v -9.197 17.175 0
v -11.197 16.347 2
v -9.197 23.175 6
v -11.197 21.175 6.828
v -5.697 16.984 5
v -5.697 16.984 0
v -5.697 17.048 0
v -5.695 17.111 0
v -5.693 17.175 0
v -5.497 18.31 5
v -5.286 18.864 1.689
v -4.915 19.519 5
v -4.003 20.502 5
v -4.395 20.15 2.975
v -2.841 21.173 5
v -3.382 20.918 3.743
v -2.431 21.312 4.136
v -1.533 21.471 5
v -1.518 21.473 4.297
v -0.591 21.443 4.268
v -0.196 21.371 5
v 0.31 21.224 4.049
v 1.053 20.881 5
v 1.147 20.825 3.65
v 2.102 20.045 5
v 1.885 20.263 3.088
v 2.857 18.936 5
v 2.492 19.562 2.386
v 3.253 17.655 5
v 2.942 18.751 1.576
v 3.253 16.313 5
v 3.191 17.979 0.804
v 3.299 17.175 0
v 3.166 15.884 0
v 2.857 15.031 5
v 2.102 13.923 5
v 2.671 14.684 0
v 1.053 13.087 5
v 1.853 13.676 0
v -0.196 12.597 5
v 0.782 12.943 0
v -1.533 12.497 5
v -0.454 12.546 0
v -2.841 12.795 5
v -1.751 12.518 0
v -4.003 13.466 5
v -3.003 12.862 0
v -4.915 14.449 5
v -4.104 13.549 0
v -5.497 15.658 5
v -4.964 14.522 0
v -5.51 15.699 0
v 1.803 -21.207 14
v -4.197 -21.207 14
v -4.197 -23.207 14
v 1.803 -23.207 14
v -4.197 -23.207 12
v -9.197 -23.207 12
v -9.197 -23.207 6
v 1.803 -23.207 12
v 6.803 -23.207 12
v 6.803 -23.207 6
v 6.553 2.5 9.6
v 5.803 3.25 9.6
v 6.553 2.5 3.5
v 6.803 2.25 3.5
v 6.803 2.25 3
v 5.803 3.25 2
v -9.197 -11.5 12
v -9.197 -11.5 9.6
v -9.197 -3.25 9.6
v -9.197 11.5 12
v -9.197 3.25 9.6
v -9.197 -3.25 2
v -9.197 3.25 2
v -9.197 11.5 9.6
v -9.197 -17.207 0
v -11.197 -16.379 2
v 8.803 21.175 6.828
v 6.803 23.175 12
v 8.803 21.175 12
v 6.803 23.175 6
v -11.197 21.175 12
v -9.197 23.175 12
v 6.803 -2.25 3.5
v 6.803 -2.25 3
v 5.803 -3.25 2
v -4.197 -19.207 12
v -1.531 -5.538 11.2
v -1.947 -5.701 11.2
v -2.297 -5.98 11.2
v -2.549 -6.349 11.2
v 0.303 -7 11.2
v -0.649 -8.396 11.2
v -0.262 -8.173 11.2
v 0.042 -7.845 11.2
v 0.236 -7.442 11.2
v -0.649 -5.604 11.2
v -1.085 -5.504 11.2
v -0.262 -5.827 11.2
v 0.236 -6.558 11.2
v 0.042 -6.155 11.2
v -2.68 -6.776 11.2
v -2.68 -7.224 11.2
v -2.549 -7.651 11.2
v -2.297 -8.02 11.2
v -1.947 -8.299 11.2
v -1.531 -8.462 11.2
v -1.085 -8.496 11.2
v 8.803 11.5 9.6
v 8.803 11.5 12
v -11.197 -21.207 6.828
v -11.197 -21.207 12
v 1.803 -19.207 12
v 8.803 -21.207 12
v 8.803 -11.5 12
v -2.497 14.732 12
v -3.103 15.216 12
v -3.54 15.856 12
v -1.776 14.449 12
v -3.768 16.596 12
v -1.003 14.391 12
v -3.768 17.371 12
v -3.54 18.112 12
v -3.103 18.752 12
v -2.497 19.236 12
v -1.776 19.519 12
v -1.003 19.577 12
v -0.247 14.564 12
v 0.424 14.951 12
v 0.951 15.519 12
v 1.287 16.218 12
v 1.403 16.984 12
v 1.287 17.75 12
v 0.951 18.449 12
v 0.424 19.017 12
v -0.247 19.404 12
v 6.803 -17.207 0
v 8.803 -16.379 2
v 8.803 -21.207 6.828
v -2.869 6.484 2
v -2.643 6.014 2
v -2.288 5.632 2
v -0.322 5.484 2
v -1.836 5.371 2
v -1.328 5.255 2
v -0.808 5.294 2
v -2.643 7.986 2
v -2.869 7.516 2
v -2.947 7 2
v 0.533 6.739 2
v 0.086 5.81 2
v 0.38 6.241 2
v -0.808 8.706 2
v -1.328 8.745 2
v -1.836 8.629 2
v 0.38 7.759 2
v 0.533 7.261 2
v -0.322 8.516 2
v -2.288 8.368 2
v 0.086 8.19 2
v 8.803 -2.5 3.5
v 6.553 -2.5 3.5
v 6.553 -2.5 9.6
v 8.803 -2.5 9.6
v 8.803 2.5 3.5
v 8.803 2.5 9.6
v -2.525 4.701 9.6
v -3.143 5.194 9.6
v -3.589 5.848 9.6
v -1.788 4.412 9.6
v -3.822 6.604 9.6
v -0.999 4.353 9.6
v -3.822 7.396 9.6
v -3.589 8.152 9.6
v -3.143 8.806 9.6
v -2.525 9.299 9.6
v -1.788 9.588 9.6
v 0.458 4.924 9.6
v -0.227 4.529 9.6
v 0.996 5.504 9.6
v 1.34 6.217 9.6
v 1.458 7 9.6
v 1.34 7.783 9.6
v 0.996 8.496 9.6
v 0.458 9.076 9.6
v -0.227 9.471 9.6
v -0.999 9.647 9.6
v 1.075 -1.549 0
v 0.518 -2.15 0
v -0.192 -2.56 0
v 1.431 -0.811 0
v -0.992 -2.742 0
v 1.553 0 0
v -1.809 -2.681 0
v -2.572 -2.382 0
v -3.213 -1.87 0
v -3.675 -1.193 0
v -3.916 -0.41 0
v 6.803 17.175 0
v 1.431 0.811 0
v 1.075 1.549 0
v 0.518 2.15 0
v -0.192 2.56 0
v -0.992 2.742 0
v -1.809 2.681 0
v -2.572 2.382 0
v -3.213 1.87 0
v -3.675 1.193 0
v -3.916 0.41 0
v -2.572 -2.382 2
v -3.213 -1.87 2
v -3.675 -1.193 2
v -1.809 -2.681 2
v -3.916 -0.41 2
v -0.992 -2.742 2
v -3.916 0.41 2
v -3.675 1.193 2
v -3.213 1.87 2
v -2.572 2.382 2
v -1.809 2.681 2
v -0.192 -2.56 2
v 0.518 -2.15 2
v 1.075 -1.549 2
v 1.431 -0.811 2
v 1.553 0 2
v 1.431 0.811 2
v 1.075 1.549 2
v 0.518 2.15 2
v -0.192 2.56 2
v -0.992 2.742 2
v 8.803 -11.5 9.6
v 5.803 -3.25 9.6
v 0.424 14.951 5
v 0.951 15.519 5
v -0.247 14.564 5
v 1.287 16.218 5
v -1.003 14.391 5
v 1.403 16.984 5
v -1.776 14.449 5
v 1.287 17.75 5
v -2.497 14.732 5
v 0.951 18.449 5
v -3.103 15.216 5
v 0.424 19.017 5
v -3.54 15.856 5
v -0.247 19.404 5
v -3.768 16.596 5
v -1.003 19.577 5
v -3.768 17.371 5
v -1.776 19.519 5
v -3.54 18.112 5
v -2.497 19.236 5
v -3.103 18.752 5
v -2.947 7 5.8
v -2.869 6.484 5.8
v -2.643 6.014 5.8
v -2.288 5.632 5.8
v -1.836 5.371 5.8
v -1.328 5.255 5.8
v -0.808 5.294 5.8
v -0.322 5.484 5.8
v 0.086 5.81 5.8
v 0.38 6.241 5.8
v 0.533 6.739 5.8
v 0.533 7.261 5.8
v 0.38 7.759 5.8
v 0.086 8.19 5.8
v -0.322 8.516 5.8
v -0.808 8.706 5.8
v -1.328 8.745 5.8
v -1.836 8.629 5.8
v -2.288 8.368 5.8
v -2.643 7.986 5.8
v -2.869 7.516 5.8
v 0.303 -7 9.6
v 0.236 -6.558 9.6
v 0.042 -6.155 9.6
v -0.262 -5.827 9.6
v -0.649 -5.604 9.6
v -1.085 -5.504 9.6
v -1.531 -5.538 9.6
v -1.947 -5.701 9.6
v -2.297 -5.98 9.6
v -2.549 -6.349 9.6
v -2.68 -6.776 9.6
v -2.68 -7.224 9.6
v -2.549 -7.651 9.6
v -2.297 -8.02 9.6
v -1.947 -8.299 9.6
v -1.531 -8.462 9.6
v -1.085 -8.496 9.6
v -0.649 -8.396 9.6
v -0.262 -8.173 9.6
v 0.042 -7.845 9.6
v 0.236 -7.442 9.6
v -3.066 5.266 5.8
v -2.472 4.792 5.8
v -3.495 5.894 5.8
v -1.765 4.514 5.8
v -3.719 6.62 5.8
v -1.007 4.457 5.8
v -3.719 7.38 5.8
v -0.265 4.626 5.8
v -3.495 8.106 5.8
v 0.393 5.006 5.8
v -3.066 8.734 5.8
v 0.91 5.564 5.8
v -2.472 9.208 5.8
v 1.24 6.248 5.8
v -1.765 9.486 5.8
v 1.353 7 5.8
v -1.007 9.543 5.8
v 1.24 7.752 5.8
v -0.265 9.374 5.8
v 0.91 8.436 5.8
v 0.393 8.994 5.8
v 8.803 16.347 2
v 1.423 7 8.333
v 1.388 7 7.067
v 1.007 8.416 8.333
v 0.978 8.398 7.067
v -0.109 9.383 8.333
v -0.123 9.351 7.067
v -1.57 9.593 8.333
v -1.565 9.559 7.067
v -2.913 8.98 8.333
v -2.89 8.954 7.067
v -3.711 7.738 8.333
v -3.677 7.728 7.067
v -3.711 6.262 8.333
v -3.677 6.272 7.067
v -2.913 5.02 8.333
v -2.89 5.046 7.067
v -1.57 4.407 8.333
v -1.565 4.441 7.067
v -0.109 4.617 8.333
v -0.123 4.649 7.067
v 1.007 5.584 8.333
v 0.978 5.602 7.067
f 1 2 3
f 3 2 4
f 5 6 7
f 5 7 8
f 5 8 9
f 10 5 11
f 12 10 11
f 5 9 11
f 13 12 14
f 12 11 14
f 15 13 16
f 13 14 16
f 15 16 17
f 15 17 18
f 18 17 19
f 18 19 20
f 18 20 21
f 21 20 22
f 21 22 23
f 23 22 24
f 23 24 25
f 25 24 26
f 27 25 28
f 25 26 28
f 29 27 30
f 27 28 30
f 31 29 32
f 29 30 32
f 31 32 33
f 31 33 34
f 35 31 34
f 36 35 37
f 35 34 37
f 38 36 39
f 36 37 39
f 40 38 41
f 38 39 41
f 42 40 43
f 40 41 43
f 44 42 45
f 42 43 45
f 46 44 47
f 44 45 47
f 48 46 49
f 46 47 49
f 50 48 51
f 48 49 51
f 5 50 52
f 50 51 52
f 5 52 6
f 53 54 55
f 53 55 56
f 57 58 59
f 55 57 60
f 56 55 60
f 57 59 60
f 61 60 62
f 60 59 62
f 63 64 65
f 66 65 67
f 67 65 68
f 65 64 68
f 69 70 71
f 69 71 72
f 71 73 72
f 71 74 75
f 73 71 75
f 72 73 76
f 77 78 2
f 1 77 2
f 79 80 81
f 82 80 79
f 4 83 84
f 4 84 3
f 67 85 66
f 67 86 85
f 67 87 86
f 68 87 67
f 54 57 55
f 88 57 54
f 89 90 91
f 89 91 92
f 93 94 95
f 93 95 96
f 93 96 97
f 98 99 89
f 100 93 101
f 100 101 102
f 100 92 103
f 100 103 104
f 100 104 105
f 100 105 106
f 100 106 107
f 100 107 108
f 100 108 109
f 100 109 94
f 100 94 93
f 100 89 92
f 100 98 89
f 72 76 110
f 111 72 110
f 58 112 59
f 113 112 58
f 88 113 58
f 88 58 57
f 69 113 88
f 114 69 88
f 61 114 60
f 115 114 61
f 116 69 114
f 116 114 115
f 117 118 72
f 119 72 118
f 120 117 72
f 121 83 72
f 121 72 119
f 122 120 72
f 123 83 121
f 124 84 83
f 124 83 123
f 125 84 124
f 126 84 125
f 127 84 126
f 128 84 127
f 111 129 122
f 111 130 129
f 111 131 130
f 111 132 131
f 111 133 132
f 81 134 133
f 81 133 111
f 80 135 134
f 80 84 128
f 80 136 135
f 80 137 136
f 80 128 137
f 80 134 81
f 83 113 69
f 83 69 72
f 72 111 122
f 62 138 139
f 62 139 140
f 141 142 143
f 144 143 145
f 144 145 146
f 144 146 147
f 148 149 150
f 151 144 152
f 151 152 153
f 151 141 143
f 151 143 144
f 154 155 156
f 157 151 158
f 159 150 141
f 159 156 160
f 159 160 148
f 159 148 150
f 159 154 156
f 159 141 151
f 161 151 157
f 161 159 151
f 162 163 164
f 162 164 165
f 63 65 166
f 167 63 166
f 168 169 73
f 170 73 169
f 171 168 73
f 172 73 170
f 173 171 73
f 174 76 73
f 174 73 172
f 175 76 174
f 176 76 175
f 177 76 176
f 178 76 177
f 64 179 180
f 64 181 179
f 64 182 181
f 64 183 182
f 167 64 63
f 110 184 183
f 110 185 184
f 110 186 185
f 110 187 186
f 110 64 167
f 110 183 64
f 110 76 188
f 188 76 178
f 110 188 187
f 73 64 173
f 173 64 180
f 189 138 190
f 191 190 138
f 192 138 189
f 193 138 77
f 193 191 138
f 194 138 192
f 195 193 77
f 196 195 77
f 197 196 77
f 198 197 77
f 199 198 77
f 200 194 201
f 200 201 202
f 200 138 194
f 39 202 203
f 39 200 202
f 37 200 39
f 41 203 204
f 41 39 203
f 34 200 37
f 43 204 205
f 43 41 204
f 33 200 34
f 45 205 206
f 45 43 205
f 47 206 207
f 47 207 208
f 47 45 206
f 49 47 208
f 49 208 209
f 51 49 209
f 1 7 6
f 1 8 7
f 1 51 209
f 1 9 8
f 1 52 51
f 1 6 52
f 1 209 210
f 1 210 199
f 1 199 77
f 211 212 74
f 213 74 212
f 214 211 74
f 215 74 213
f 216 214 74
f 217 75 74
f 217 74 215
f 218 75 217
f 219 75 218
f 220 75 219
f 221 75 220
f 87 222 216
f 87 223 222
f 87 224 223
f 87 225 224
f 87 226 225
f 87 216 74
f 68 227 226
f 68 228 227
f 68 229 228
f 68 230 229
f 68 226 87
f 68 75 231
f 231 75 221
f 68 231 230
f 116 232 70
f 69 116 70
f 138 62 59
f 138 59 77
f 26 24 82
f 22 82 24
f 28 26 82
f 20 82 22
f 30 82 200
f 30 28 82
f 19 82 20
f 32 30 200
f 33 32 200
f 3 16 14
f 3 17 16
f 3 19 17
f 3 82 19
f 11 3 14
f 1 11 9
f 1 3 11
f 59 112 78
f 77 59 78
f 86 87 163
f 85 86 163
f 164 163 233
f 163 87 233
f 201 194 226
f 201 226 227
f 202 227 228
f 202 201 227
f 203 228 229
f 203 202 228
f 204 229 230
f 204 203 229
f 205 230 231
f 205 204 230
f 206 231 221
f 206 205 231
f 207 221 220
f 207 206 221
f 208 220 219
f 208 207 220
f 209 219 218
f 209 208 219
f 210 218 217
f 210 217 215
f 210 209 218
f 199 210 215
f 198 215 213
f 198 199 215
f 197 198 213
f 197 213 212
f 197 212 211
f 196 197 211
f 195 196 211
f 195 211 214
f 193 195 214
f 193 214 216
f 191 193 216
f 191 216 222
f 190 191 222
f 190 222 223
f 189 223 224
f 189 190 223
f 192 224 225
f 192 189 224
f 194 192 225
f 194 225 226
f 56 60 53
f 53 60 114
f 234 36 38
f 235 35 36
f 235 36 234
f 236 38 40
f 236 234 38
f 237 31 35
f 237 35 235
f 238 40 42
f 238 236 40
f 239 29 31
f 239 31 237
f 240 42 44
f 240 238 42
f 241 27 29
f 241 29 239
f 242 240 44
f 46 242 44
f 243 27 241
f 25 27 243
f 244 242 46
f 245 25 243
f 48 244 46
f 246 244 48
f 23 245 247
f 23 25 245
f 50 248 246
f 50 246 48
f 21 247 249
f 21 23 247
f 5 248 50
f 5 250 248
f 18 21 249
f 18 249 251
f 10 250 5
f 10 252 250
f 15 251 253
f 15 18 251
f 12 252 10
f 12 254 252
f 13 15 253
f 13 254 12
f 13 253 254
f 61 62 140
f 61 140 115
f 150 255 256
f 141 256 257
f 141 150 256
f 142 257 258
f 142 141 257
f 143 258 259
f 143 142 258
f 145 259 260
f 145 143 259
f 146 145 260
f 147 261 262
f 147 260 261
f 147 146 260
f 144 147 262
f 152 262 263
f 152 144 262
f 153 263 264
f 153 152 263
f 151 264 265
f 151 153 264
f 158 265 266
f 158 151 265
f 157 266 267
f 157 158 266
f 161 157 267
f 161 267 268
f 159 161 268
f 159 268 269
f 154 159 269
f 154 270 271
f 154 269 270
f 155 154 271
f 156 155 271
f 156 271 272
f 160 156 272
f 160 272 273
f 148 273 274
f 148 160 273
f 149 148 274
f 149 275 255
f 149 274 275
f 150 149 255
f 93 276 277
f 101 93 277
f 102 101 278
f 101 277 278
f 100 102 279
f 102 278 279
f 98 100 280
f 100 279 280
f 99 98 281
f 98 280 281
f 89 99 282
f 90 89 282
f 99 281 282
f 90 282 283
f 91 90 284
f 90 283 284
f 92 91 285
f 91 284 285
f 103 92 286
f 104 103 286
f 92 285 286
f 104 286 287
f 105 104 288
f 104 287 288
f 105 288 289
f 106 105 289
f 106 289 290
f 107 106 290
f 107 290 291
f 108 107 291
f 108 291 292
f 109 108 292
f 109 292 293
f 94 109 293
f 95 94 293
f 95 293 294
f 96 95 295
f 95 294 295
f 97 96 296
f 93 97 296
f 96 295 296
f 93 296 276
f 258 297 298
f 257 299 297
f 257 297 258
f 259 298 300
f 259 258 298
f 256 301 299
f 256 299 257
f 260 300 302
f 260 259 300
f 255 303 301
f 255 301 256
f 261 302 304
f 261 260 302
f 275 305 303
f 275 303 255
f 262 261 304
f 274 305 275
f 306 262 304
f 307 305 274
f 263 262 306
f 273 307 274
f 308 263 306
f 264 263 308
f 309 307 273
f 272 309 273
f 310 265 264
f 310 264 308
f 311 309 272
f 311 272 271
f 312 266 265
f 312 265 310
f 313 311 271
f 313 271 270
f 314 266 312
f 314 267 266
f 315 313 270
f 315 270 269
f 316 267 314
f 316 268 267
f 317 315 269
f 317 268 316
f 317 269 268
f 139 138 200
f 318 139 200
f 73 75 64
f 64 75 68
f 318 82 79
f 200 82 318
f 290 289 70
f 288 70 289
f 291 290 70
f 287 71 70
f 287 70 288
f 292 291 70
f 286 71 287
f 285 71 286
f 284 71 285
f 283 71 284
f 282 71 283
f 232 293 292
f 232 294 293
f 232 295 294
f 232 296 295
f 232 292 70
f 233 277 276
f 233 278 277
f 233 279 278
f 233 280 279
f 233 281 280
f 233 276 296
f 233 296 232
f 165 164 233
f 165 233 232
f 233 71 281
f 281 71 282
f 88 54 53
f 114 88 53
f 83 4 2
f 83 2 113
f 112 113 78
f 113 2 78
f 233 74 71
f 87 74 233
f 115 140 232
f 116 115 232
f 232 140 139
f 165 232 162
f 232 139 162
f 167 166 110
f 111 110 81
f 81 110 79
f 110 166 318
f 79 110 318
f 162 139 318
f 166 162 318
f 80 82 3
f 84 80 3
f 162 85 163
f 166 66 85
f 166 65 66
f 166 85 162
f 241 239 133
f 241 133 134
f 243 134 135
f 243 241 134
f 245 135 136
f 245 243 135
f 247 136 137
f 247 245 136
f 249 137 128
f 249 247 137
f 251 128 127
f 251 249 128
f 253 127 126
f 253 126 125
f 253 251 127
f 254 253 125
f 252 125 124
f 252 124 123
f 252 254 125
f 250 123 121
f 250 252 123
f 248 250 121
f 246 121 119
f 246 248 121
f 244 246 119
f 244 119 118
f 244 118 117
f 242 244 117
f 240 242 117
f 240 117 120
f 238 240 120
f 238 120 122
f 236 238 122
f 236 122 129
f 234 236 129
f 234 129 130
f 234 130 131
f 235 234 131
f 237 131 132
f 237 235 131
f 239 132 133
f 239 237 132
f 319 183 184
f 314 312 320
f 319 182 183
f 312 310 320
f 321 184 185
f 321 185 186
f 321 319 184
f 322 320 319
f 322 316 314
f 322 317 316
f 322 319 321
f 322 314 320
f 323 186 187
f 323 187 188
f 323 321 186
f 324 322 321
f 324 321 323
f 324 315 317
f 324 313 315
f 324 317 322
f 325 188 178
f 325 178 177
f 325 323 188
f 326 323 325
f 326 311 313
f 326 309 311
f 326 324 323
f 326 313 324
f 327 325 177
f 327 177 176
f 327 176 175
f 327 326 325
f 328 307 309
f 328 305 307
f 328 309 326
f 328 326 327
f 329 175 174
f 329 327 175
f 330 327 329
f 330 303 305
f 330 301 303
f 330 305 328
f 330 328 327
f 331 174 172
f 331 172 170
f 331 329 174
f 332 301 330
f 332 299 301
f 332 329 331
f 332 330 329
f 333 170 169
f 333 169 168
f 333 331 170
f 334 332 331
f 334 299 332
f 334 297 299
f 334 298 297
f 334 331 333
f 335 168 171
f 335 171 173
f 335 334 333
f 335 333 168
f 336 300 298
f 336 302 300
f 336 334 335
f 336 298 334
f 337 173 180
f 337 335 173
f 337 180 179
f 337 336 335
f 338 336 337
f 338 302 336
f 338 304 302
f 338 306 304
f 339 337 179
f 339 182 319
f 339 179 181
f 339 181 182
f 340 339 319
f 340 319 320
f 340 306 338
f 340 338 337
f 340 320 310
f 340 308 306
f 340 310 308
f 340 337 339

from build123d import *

# Parameters (mm, degrees)
SKETCH1_W            = 20
SKETCH1_H            = 46.382365304
SKETCH1_R            = 2.6
SKETCH1_R_2          = 1.75
SKETCH1_R_3          = 2.75
BOSS_EXTRUDE2_DEPTH  = 2
SKETCH2_R            = 2.6
BOSS_EXTRUDE3_DEPTH  = 10
SKETCH4_R            = 1.75
BOSS_EXTRUDE5_DEPTH  = 2
SKETCH5_R            = 4.5
CUT_EXTRUDE1_DEPTH   = 5
SKETCH3_W            = 18
SKETCH3_H            = 8.25
SKETCH3_R            = 1.75
BOSS_EXTRUDE9_DEPTH  = 7.6
SKETCH8_R            = 2.55
CUT_EXTRUDE3_DEPTH   = 3.8
CHAMFER5_SIZE2       = 3.8
CHAMFER5_SIZE        = 0.105
CHAMFER6_SIZE        = 6
CHAMFER7_SIZE        = 2
SKETCH9_W            = 2
SKETCH9_H            = 6.5
BOSS_EXTRUDE10_DEPTH = 1.5
SKETCH10_W           = 2
SKETCH10_H           = 0.75
BOSS_EXTRUDE11_DEPTH = 6.1
CHAMFER8_SIZE        = 1
SKETCH13_R           = 1.875965007
BOSS_EXTRUDE14_DEPTH = 7.6
SKETCH12_R           = 1.5
BOSS_EXTRUDE15_DEPTH = 1.6
SKETCH14_W           = 6
SKETCH14_H           = 4
BOSS_EXTRUDE16_DEPTH = 2
CHAMFER9_SIZE        = 2


# Some blends are built 0.0001 mm under size
with BuildPart() as part:
    # Sketch1 → Boss-Extrude2 (new body)
    with BuildSketch(Plane.XY):
        with Locations((-1.1970966, -0.016031908)):
            Rectangle(SKETCH1_W, SKETCH1_H)
        with Locations((-1.1970966, 16.983968092)):
            Circle(SKETCH1_R, mode=Mode.SUBTRACT)
        with Locations((-1.1970966, 7)):
            Circle(SKETCH1_R_2, mode=Mode.SUBTRACT)
        with Locations((-1.1970966, 0)):
            Circle(SKETCH1_R_3, mode=Mode.SUBTRACT)
    extrude(amount=BOSS_EXTRUDE2_DEPTH)

    # Sketch2 → Boss-Extrude3 (add)
    with BuildSketch(Plane.XY.offset(2)):
        Polygon((-11.1970966, 23.175150744), (-11.1970966, -23.20721456), (8.8029034, -23.20721456), (8.8029034, -11.5), (-9.1970966, -11.5), (-9.1970966, 11.5), (8.8029034, 11.5), (8.8029034, 23.175150744), align=None)
        with Locations((-1.1970966, 16.983968092)):
            Circle(SKETCH2_R, mode=Mode.SUBTRACT)
    extrude(amount=BOSS_EXTRUDE3_DEPTH)

    # Sketch4 → Boss-Extrude5 (add)
    with BuildSketch(Plane(origin=(0, 0, 0), x_dir=(-1, 0, 0), z_dir=(0, 0, -1))):
        with Locations((1.1970966, 7)):
            Circle(SKETCH4_R)
    extrude(amount=-BOSS_EXTRUDE5_DEPTH)

    # Sketch5 → Cut-Extrude1 (cut)
    with BuildSketch(Plane(origin=(0, 0, 0), x_dir=(-1, 0, 0), z_dir=(0, 0, -1))):
        with Locations((1.1970966, 16.983968092)):
            Circle(SKETCH5_R)
    extrude(amount=-CUT_EXTRUDE1_DEPTH, mode=Mode.SUBTRACT)

    # Sketch3 → Boss-Extrude9 (add)
    # profile 1 of 2: a face of its own
    with BuildSketch(Plane.XY.offset(2)):
        with Locations((-0.1970966, -7.375)):
            Rectangle(SKETCH3_W, SKETCH3_H)
        with Locations(Location((-1.1970966, -7, 0), (0, 0, 180))):
            Circle(SKETCH3_R, mode=Mode.SUBTRACT)
    # profile 2 of 2: a face of its own
    with BuildSketch(Plane.XY.offset(2)):
        with Locations((-0.1970966, 7.375)):
            Rectangle(SKETCH3_W, SKETCH3_H)
        with Locations(Location((-1.1970966, 7, 0), (0, 0, 180))):
            Circle(SKETCH3_R, mode=Mode.SUBTRACT)
    extrude(amount=BOSS_EXTRUDE9_DEPTH)

    # Sketch8 → Cut-Extrude3 (cut)
    with BuildSketch(Plane.XY.offset(9.6)):
        with Locations((-1.1970966, 7)):
            Circle(SKETCH8_R)
    extrude(amount=-CUT_EXTRUDE3_DEPTH, mode=Mode.SUBTRACT)

    # Chamfer5
    chamfer5_edges = [part.edges().sort_by_distance(p)[0] for p in [
        (-3.7470966, 7, 9.6),
    ]]
    chamfer5_side = [part.faces().sort_by_distance(p)[0] for p in [
        (-3.7491966, 7, 9.6),
    ]]
    chamfer(chamfer5_edges, length=CHAMFER5_SIZE - 0.0001, length2=CHAMFER5_SIZE2 - 0.0001, reference=chamfer5_side[0])  # a hair under: the kernel refuses the full size

    # Chamfer6
    # the kernel refuses this chamfer: 6 mm, written as the material it takes off along each edge
    with BuildSketch(Plane(origin=(-26.627194528, 23.175150744, 0), x_dir=(0, 0.027495876610586202, 0.9996219169112968), z_dir=(1, 0, 0)), Plane(origin=(24.233001328, -23.20721456, 0), x_dir=(0, -0.027495876610586202, 0.9996219169112968), z_dir=(-1, 0, 0))) as chamfer6_piece_1:
        Polygon((CHAMFER6_SIZE * 0.999621916911, CHAMFER6_SIZE * 0.0274958766106), (-CHAMFER6_SIZE * 0.0274958766106, CHAMFER6_SIZE * 0.999621916911), (0, 0), align=None)
    extrude(amount=50.860195856, mode=Mode.SUBTRACT)

    # Chamfer7
    chamfer7_edges = [part.edges().sort_by_distance(p)[0] for p in [
        (-11.1970966, -0.016031908, 0),
        (8.8029034, -0.016031908, 0),
        (8.8029034, -20.20721456, 3),
        (8.8029034, 20.175150744, 3),
        (-11.1970966, -20.20721456, 3),
        (-11.1970966, 20.175150744, 3),
        (-11.1970966, -23.20721456, 9),
        (-11.1970966, 23.175150744, 9),
        (8.8029034, 23.175150744, 9),
        (8.8029034, -23.20721456, 9),
    ]]
    chamfer(chamfer7_edges, length=CHAMFER7_SIZE - 0.0001)  # a hair under: the kernel refuses the full size

    # Sketch9 → Boss-Extrude10 (add)
    with BuildSketch(Plane.XY.offset(2)):
        with Locations((7.8029034, 0)):
            Rectangle(SKETCH9_W, SKETCH9_H)
    extrude(amount=BOSS_EXTRUDE10_DEPTH)

    # Sketch10 → Boss-Extrude11 (add)
    with BuildSketch(Plane.XY.offset(3.5)):
        with Locations((7.8029034, 2.875)):
            Rectangle(SKETCH10_W, SKETCH10_H)
        with Locations((7.8029034, -2.875)):
            Rectangle(SKETCH10_W, SKETCH10_H)
    extrude(amount=BOSS_EXTRUDE11_DEPTH)

    # Chamfer8
    chamfer8_edges = [part.edges().sort_by_distance(p)[0] for p in [
        (6.8029034, -3.25, 5.8),
        (6.8029034, 0, 2),
        (6.8029034, 3.25, 5.8),
    ]]
    chamfer(chamfer8_edges, length=CHAMFER8_SIZE)

    # Sketch13 → Boss-Extrude14 (add)
    with BuildSketch(Plane.XY.offset(2)):
        with Locations((-1.1970966, -7)):
            Circle(SKETCH13_R)
    extrude(amount=BOSS_EXTRUDE14_DEPTH)

    # Sketch12 → Boss-Extrude15 (add)
    with BuildSketch(Plane.XY.offset(9.6)):
        with Locations((-1.1970966, -7)):
            Circle(SKETCH12_R)
    extrude(amount=BOSS_EXTRUDE15_DEPTH)

    # Sketch14 → Boss-Extrude16 (add)
    with BuildSketch(Plane.XY.offset(12)):
        with Locations((-1.1970966, -21.20721456)):
            Rectangle(SKETCH14_W, SKETCH14_H)
    extrude(amount=BOSS_EXTRUDE16_DEPTH)

    # Chamfer9
    chamfer9_edges = [part.edges().sort_by_distance(p)[0] for p in [
        (-1.1970966, -19.20721456, 14),
    ]]
    chamfer(chamfer9_edges, length=CHAMFER9_SIZE - 0.0001)  # a hair under: the kernel refuses the full size


solid = part.part
